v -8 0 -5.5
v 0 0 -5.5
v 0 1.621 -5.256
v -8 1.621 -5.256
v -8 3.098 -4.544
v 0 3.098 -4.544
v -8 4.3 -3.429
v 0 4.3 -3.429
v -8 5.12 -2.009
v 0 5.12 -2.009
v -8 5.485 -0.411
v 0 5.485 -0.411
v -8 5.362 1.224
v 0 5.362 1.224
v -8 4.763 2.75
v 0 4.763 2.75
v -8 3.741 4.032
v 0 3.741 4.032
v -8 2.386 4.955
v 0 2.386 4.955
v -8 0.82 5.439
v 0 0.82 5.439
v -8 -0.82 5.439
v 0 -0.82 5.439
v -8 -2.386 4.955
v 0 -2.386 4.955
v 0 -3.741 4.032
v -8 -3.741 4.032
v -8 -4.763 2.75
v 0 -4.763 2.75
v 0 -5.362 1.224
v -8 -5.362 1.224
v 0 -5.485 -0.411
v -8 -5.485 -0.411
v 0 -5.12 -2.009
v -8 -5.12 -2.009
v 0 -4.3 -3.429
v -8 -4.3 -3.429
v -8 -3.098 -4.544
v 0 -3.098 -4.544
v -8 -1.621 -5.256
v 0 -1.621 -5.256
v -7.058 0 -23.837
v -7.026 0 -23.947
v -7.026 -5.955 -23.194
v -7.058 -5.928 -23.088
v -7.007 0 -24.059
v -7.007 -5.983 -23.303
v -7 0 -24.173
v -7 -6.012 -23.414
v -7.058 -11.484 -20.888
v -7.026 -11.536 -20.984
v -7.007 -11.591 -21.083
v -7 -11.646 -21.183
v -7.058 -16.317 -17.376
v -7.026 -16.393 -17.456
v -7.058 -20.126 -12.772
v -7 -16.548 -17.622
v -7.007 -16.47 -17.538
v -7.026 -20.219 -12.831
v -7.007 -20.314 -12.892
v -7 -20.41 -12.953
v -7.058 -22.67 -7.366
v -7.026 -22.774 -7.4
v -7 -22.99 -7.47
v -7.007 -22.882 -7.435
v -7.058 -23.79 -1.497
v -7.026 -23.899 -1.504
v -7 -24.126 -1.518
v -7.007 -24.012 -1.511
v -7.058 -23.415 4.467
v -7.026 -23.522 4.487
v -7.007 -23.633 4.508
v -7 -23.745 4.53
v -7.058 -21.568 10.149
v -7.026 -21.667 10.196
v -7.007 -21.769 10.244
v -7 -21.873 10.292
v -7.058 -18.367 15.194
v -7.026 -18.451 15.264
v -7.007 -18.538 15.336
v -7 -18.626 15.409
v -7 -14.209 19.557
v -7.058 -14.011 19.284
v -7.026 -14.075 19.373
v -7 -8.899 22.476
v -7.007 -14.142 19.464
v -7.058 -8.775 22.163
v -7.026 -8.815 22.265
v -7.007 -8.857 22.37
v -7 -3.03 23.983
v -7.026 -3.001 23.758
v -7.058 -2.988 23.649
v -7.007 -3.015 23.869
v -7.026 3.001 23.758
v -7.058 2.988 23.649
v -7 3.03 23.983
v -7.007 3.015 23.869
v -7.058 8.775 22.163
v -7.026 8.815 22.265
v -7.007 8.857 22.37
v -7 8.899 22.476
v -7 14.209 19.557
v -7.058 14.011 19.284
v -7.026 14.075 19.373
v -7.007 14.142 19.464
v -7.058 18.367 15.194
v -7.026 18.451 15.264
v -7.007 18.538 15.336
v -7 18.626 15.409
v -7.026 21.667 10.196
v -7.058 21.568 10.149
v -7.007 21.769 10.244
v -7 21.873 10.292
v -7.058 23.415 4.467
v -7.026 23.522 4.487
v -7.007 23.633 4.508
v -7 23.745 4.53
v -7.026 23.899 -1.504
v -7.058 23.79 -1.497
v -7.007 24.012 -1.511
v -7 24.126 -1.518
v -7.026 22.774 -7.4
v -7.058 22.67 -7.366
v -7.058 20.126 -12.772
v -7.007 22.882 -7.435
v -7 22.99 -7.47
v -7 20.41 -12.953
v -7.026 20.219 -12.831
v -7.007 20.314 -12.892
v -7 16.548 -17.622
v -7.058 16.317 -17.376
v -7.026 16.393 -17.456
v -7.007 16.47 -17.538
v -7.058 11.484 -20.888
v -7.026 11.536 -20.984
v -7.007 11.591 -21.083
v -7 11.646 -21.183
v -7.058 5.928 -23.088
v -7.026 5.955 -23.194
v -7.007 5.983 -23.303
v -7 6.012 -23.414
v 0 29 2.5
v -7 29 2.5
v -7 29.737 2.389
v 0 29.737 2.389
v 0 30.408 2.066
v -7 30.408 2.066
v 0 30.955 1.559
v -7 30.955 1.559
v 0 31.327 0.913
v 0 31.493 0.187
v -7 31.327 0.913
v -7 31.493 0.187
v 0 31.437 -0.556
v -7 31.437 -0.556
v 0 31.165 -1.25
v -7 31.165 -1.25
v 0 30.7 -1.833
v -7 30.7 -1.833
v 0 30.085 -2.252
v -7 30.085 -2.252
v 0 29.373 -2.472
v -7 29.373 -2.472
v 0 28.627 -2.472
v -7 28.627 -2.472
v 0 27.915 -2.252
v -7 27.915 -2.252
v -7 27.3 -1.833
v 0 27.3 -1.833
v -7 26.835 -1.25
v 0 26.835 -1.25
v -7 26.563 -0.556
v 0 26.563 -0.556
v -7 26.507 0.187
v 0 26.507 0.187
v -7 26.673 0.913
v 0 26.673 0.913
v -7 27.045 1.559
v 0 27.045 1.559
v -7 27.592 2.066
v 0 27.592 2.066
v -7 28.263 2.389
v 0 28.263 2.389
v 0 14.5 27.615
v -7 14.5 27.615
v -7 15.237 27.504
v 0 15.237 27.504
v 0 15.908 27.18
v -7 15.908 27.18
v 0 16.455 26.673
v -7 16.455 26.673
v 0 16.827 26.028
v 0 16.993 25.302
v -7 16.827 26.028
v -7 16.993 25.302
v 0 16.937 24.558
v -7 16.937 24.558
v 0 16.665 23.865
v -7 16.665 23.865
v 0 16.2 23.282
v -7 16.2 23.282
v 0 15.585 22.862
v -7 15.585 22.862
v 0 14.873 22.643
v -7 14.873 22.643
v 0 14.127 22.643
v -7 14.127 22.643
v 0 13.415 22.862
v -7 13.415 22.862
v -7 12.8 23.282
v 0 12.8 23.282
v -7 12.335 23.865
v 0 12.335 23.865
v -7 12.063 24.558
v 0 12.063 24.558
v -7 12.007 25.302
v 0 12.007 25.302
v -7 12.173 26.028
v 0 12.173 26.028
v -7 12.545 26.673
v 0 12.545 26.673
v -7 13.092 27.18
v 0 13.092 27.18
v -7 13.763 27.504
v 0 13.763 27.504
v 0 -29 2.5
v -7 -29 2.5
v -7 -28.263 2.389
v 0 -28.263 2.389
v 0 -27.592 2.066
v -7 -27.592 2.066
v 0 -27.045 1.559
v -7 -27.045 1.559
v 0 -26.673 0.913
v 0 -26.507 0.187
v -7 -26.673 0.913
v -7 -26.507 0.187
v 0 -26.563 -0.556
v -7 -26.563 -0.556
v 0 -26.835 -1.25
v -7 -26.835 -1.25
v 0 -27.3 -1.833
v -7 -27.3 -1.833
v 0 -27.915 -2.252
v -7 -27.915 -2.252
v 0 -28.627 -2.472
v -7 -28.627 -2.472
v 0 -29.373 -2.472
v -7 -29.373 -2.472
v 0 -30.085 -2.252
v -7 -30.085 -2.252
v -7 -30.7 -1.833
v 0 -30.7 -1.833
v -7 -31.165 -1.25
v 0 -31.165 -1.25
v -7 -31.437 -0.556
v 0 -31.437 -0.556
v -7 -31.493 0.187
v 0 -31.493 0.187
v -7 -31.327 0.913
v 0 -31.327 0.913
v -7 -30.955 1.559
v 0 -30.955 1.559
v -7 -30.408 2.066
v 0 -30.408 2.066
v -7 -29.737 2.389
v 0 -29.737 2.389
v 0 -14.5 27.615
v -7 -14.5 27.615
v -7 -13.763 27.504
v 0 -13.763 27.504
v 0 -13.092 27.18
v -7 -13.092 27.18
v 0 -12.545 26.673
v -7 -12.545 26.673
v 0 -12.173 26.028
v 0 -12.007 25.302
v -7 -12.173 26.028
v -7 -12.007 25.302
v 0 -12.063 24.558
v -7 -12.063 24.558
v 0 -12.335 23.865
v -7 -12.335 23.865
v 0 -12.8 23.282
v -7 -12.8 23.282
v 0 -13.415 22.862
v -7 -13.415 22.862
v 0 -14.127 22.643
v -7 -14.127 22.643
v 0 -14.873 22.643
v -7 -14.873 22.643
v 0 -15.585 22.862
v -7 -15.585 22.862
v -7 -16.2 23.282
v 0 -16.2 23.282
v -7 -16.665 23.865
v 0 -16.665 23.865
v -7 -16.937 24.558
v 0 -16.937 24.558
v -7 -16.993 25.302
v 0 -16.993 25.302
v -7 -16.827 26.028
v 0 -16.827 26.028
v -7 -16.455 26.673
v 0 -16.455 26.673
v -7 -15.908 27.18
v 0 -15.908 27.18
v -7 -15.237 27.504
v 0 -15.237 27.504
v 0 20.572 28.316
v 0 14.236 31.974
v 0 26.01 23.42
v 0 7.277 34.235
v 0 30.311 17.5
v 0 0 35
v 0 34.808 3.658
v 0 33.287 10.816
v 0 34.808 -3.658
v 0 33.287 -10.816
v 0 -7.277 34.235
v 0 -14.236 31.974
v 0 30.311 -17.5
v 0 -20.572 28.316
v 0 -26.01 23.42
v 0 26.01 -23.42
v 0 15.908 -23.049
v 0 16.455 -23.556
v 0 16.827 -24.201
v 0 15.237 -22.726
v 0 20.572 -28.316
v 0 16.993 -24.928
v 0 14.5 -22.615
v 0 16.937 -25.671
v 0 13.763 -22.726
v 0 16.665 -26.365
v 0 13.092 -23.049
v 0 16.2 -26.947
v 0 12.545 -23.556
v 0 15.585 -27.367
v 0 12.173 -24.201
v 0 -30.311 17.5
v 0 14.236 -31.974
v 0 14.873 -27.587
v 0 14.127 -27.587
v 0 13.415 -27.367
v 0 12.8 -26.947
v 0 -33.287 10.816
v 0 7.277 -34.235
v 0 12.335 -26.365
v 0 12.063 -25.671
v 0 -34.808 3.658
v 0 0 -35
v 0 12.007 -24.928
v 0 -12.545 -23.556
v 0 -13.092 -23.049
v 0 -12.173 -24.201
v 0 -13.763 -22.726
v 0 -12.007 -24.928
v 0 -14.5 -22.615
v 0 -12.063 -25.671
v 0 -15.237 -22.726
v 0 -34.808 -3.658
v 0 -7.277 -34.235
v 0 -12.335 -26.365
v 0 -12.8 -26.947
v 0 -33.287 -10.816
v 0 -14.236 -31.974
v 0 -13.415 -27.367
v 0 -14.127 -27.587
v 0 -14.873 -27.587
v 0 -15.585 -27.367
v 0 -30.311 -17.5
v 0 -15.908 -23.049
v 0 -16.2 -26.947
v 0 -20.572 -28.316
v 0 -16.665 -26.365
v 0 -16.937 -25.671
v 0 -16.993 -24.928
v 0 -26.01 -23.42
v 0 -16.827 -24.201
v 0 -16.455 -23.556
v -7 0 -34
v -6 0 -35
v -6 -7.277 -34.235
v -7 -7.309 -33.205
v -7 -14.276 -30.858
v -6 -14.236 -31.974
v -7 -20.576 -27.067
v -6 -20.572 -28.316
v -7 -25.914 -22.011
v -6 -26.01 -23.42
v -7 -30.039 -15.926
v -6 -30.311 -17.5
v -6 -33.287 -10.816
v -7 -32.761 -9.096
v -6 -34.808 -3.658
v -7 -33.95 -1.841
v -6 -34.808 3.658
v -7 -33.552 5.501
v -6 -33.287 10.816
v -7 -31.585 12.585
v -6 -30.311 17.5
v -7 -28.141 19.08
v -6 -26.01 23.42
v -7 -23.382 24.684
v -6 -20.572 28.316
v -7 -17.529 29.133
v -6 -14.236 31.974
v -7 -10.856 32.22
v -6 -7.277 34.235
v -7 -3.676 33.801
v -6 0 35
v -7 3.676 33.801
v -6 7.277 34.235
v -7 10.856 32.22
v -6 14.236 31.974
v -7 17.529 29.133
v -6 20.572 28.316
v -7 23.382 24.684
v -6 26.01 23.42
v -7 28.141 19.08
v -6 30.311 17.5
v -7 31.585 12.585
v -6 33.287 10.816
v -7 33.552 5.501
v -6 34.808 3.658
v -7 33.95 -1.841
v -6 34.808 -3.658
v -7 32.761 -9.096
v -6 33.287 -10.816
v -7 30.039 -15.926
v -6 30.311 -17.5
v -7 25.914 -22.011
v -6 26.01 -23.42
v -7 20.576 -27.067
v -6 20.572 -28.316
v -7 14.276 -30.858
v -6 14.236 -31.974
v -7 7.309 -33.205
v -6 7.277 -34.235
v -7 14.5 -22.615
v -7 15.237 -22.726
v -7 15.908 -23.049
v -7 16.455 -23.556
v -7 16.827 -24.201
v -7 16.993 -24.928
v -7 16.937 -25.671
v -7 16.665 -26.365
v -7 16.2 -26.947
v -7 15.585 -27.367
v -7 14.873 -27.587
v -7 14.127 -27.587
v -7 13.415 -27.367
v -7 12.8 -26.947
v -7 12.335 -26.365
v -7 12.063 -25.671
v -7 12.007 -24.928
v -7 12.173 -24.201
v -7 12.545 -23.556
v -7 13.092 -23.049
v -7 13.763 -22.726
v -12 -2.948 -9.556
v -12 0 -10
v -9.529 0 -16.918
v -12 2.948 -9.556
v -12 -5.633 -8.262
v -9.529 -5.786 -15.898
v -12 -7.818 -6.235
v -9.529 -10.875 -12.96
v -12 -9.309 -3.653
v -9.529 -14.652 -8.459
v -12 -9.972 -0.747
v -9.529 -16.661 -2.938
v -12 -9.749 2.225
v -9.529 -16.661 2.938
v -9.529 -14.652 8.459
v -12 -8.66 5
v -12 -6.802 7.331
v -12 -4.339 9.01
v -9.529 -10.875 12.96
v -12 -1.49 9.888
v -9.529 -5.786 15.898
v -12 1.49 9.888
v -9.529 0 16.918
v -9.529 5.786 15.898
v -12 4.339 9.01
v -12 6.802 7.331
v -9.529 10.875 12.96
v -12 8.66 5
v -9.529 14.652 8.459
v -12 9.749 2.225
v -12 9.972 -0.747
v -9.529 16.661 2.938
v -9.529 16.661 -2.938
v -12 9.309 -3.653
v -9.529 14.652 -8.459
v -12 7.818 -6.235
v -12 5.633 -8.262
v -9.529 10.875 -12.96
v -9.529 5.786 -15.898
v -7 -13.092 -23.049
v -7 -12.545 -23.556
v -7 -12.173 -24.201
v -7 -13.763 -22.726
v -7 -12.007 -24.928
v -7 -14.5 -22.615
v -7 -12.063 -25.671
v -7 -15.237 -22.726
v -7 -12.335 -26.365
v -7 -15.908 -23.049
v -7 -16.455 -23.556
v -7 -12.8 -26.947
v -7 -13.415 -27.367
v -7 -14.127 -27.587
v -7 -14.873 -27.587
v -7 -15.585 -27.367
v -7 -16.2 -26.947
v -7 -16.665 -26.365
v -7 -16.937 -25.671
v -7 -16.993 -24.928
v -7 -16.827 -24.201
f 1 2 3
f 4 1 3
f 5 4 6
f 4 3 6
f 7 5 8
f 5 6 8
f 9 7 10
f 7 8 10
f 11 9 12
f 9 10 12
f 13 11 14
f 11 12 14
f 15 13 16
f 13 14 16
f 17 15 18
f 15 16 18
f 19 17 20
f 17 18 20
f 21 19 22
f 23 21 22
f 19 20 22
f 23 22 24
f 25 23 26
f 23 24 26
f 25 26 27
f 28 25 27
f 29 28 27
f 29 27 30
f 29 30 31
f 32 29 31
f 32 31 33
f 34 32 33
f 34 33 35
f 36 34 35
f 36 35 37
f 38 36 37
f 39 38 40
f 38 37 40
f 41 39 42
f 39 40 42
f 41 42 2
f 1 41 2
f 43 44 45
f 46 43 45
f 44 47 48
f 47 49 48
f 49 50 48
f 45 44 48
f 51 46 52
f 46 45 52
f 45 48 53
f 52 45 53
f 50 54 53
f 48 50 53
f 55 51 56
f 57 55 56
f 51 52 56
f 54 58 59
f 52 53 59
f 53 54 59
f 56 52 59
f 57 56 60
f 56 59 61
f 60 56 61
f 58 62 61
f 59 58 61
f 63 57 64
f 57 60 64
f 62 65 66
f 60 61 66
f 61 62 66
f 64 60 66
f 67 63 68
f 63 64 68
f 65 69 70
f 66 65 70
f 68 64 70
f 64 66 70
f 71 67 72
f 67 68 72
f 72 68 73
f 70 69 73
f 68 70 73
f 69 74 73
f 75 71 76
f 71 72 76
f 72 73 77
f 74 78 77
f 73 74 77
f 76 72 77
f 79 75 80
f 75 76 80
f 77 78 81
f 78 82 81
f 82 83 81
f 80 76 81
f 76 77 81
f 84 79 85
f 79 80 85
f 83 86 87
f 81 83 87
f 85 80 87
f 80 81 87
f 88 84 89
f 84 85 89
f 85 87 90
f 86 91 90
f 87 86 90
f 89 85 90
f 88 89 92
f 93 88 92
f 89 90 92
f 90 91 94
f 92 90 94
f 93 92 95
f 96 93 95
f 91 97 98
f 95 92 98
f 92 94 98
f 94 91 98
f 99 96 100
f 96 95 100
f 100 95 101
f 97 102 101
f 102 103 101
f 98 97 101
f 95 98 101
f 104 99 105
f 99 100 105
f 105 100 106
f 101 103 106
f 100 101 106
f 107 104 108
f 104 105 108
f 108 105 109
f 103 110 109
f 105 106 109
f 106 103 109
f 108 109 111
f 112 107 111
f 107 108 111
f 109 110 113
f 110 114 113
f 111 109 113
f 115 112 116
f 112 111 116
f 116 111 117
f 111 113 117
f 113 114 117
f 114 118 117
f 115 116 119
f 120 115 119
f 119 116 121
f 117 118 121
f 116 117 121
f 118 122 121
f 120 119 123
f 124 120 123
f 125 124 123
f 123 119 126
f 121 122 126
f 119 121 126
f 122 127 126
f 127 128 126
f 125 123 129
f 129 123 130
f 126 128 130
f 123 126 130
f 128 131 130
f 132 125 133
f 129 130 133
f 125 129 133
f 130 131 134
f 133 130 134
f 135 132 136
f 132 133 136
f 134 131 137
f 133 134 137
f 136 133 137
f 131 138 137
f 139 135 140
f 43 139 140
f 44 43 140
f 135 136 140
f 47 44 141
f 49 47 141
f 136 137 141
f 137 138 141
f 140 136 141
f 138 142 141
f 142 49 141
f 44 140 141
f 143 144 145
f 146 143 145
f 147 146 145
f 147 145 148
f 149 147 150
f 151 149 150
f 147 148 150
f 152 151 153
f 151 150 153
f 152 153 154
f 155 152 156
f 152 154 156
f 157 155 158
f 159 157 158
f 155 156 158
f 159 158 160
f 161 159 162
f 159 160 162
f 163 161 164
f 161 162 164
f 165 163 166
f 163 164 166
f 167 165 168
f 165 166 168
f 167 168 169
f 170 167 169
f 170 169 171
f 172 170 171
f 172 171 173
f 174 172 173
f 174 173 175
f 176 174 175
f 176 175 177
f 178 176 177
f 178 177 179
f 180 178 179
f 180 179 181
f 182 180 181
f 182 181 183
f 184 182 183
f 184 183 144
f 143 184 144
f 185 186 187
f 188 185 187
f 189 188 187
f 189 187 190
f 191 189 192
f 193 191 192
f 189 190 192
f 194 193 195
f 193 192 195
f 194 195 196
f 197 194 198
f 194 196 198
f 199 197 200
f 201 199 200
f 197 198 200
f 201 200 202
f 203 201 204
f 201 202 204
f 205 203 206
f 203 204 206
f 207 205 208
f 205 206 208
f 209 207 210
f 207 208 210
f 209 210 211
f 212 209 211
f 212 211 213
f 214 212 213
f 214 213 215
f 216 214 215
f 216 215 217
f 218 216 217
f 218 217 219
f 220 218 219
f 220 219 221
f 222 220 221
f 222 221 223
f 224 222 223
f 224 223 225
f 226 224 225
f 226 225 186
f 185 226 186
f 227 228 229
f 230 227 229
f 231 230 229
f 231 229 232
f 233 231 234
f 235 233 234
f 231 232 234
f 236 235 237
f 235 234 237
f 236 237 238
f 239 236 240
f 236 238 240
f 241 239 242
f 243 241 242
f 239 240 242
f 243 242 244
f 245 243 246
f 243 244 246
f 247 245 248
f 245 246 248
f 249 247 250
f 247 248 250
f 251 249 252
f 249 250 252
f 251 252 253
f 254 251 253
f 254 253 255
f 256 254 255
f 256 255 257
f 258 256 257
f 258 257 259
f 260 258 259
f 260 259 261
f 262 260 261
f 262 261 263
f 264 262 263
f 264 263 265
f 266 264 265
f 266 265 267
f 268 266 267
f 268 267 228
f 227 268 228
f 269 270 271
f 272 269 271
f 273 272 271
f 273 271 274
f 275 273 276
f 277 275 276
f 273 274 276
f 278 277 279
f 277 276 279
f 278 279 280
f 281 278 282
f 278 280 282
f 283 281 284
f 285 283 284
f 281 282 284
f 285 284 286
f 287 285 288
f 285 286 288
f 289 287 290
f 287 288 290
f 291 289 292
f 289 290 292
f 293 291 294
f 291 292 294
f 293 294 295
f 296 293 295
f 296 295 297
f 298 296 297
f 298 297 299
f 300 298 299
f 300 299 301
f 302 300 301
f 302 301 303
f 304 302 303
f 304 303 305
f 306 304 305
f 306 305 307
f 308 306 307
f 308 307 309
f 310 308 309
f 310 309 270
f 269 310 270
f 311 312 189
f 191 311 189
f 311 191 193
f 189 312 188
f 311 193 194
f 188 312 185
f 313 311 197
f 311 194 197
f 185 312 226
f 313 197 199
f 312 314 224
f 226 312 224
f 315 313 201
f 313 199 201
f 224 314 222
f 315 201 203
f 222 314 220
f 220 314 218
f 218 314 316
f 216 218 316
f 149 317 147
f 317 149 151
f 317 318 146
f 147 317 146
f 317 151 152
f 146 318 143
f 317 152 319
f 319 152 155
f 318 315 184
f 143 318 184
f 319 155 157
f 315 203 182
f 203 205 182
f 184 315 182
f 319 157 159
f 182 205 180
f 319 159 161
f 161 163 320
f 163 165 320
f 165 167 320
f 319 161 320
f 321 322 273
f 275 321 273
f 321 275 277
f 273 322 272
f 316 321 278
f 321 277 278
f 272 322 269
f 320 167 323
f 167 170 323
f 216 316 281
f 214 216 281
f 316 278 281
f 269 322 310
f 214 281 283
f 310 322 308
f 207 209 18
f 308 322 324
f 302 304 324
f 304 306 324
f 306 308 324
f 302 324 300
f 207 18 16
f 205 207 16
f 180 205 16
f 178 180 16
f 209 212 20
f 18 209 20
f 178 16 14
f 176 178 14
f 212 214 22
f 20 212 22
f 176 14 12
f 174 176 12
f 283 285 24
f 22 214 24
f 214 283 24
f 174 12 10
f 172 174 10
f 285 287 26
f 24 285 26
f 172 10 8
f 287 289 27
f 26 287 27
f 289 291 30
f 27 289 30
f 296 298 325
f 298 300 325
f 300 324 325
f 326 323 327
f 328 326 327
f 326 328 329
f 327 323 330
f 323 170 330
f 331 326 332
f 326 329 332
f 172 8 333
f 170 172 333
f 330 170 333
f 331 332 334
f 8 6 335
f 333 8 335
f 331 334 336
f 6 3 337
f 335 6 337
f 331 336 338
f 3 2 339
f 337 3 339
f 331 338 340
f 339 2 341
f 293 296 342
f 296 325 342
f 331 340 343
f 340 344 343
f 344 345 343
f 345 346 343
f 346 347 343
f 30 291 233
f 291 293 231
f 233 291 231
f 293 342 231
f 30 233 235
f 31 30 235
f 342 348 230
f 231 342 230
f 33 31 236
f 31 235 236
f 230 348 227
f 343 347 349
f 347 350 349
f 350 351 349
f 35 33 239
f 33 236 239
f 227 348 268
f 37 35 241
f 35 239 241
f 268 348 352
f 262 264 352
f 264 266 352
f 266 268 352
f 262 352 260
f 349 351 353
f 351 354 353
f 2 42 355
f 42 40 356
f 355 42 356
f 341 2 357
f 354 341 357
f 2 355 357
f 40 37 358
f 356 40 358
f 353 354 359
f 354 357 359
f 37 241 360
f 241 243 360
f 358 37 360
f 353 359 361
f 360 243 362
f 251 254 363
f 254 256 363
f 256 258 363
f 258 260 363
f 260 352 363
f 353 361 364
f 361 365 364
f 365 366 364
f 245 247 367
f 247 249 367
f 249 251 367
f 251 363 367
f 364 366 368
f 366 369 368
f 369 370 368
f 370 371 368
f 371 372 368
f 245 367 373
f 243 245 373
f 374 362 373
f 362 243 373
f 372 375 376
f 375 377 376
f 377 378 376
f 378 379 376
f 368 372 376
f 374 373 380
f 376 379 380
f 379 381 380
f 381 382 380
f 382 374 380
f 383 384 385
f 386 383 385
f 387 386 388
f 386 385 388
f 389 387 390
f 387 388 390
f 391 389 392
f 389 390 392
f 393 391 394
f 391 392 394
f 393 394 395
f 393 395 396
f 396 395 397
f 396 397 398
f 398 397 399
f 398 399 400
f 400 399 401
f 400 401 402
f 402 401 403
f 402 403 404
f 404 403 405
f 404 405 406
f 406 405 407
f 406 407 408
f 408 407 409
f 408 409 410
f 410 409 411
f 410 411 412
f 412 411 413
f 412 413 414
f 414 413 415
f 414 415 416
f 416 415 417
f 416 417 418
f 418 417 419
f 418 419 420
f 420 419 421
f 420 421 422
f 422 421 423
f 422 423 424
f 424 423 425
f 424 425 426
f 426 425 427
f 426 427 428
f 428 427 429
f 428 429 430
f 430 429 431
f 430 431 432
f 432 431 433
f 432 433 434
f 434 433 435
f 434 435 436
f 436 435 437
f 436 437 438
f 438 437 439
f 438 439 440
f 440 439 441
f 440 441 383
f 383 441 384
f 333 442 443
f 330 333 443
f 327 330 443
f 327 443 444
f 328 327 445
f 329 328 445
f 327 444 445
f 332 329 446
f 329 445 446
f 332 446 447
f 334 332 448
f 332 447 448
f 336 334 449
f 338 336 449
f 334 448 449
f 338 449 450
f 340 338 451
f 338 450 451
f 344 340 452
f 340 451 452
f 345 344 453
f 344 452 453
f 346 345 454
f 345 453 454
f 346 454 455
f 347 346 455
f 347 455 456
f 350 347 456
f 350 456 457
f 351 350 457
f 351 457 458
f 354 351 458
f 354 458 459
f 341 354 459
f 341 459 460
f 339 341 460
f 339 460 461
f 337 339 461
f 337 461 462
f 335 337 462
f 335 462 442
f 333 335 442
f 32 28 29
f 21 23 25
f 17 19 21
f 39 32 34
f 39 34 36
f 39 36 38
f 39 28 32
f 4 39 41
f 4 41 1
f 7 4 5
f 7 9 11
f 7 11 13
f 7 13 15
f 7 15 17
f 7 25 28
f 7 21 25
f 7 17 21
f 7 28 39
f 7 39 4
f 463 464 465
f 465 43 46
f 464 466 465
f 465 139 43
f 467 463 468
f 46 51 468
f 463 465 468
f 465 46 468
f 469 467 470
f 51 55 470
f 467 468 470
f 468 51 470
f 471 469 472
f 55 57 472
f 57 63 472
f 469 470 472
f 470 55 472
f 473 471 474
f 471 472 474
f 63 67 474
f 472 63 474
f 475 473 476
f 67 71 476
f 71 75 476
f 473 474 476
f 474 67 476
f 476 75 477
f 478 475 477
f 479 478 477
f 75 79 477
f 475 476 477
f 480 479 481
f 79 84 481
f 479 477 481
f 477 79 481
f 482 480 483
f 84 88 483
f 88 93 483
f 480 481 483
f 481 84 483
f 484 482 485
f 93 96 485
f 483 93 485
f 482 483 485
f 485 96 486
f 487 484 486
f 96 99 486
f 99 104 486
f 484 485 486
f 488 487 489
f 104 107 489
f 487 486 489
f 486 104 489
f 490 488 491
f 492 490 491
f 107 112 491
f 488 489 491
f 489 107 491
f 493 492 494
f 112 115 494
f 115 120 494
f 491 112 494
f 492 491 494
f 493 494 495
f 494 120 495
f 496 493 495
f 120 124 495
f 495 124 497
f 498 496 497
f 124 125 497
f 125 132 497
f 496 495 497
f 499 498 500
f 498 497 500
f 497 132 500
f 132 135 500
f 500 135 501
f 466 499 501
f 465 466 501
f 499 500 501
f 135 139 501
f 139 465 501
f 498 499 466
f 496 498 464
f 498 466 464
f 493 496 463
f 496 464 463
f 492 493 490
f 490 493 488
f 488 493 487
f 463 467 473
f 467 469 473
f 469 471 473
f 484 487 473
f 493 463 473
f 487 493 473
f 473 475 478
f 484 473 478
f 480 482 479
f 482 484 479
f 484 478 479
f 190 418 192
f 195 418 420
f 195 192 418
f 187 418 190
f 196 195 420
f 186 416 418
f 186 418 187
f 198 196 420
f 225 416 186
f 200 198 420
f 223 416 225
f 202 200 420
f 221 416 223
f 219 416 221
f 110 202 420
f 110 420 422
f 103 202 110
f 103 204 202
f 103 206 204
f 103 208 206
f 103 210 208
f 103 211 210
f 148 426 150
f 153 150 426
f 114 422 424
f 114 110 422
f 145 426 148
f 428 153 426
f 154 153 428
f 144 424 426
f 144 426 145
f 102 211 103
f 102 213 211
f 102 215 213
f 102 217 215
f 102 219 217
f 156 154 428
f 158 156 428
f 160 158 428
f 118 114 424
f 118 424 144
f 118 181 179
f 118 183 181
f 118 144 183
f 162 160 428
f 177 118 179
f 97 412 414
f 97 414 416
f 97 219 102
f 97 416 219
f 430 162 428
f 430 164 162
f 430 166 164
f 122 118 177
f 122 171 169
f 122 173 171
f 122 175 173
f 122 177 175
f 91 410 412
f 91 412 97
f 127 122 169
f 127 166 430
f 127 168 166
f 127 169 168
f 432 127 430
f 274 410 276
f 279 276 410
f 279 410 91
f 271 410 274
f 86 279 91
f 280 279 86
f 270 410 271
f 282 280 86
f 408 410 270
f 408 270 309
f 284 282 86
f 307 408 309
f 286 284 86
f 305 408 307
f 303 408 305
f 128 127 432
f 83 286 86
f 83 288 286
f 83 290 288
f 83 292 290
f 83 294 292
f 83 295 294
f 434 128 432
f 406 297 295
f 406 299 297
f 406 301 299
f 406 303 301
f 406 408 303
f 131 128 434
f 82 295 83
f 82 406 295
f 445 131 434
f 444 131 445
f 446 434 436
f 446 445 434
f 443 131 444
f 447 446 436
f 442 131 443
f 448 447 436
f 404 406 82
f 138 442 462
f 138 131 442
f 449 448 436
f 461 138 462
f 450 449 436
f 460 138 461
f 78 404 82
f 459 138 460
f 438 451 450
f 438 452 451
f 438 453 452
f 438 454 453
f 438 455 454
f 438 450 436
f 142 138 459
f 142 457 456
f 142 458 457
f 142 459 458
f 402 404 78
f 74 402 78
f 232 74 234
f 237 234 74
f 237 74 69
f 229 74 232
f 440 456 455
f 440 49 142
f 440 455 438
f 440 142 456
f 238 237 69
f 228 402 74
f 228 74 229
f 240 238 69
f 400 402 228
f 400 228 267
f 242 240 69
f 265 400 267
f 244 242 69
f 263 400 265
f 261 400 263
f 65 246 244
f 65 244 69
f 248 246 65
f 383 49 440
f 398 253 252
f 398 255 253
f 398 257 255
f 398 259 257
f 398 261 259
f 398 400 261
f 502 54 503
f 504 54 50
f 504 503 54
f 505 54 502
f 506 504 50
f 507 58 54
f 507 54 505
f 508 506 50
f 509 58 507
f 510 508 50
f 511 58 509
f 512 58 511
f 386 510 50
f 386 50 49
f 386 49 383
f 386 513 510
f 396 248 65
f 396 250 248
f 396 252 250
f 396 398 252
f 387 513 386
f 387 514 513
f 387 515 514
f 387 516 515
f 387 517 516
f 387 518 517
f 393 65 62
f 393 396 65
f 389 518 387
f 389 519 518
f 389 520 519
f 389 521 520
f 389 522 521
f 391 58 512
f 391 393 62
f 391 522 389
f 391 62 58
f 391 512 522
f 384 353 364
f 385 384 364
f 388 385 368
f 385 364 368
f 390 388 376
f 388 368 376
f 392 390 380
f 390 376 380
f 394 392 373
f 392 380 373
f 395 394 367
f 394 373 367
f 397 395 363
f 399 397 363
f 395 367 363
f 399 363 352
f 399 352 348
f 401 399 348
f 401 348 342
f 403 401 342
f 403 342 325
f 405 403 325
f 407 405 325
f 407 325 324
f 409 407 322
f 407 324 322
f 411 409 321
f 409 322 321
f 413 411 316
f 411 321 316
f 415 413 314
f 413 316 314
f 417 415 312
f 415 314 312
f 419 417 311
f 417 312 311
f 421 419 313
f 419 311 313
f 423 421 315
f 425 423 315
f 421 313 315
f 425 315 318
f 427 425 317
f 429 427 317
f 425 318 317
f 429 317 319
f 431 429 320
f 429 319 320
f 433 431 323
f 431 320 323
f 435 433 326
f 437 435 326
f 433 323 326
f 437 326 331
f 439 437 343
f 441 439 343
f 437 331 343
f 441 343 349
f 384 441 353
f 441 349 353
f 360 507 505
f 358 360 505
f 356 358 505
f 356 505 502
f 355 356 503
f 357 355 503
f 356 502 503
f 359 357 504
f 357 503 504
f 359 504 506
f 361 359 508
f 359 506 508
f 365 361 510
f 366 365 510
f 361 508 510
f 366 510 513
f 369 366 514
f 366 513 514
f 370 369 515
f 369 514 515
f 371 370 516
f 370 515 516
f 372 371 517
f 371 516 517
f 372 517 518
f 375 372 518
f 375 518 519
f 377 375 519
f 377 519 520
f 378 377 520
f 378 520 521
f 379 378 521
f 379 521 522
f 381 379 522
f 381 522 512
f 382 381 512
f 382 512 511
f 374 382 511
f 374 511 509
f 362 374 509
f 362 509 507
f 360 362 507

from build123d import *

# Parameters (mm, degrees)
SCHIZZO1_W               = 7
SCHIZZO1_H               = 35
SCHIZZO2_R               = 2.5
TAGLIO_ESTRUSIONE1_DEPTH = 50.989999
SCHIZZO3_R               = 5.5
TAGLIO_ESTRUSIONE2_DEPTH = 8
RACCORDO1_R              = 1
SMUSSO1_SIZE             = 1


with BuildPart() as part:
    # Schizzo1 → Rivoluzione1 (revolve)
    with BuildSketch(Plane(origin=(0, 0, 0), x_dir=(1, 0, 0), z_dir=(0, 1, 0)), mode=Mode.PRIVATE) as rivoluzione1_sk:
        Polygon((-7, -24), (-7, 0), (-12, 0), (-12, -10), align=None)
        with Locations((-3.5, -17.5)):
            Rectangle(SCHIZZO1_W, SCHIZZO1_H)
    revolve(rivoluzione1_sk.sketch.rotate(Axis((0, 0, 0), (-1, 0, 0)), 180), axis=Axis((0, 0, 0), (-1, 0, 0)))

    # Schizzo2 → Taglio-Estrusione1 (cut, through all)
    with BuildSketch(Plane.ZY.offset(7)):
        with Locations((0, 29)):
            Circle(SCHIZZO2_R)
        with Locations((-25.11473671, 14.5)):
            Circle(SCHIZZO2_R)
        with Locations((-25.11473671, -14.5)):
            Circle(SCHIZZO2_R)
        with Locations((0, -29)):
            Circle(SCHIZZO2_R)
        with Locations((25.11473671, -14.5)):
            Circle(SCHIZZO2_R)
        with Locations((25.11473671, 14.5)):
            Circle(SCHIZZO2_R)
    extrude(amount=-TAGLIO_ESTRUSIONE1_DEPTH, mode=Mode.SUBTRACT)

    # Schizzo3 → Taglio-Estrusione2 (cut)
    with BuildSketch(Plane(origin=(0, 0, 0), x_dir=(0, 0, -1), z_dir=(1, 0, 0))):
        Circle(SCHIZZO3_R)
    extrude(amount=-TAGLIO_ESTRUSIONE2_DEPTH, mode=Mode.SUBTRACT)

    # Raccordo1
    raccordo1_edges = [part.edges().sort_by_distance(p)[0] for p in [
        (-7, 0, 24),
    ]]
    fillet(raccordo1_edges, radius=RACCORDO1_R)

    # Smusso1
    smusso1_edges = [part.edges().sort_by_distance(p)[0] for p in [
        (-7, 0, 35),
    ]]
    chamfer(smusso1_edges, length=SMUSSO1_SIZE)


solid = part.part
